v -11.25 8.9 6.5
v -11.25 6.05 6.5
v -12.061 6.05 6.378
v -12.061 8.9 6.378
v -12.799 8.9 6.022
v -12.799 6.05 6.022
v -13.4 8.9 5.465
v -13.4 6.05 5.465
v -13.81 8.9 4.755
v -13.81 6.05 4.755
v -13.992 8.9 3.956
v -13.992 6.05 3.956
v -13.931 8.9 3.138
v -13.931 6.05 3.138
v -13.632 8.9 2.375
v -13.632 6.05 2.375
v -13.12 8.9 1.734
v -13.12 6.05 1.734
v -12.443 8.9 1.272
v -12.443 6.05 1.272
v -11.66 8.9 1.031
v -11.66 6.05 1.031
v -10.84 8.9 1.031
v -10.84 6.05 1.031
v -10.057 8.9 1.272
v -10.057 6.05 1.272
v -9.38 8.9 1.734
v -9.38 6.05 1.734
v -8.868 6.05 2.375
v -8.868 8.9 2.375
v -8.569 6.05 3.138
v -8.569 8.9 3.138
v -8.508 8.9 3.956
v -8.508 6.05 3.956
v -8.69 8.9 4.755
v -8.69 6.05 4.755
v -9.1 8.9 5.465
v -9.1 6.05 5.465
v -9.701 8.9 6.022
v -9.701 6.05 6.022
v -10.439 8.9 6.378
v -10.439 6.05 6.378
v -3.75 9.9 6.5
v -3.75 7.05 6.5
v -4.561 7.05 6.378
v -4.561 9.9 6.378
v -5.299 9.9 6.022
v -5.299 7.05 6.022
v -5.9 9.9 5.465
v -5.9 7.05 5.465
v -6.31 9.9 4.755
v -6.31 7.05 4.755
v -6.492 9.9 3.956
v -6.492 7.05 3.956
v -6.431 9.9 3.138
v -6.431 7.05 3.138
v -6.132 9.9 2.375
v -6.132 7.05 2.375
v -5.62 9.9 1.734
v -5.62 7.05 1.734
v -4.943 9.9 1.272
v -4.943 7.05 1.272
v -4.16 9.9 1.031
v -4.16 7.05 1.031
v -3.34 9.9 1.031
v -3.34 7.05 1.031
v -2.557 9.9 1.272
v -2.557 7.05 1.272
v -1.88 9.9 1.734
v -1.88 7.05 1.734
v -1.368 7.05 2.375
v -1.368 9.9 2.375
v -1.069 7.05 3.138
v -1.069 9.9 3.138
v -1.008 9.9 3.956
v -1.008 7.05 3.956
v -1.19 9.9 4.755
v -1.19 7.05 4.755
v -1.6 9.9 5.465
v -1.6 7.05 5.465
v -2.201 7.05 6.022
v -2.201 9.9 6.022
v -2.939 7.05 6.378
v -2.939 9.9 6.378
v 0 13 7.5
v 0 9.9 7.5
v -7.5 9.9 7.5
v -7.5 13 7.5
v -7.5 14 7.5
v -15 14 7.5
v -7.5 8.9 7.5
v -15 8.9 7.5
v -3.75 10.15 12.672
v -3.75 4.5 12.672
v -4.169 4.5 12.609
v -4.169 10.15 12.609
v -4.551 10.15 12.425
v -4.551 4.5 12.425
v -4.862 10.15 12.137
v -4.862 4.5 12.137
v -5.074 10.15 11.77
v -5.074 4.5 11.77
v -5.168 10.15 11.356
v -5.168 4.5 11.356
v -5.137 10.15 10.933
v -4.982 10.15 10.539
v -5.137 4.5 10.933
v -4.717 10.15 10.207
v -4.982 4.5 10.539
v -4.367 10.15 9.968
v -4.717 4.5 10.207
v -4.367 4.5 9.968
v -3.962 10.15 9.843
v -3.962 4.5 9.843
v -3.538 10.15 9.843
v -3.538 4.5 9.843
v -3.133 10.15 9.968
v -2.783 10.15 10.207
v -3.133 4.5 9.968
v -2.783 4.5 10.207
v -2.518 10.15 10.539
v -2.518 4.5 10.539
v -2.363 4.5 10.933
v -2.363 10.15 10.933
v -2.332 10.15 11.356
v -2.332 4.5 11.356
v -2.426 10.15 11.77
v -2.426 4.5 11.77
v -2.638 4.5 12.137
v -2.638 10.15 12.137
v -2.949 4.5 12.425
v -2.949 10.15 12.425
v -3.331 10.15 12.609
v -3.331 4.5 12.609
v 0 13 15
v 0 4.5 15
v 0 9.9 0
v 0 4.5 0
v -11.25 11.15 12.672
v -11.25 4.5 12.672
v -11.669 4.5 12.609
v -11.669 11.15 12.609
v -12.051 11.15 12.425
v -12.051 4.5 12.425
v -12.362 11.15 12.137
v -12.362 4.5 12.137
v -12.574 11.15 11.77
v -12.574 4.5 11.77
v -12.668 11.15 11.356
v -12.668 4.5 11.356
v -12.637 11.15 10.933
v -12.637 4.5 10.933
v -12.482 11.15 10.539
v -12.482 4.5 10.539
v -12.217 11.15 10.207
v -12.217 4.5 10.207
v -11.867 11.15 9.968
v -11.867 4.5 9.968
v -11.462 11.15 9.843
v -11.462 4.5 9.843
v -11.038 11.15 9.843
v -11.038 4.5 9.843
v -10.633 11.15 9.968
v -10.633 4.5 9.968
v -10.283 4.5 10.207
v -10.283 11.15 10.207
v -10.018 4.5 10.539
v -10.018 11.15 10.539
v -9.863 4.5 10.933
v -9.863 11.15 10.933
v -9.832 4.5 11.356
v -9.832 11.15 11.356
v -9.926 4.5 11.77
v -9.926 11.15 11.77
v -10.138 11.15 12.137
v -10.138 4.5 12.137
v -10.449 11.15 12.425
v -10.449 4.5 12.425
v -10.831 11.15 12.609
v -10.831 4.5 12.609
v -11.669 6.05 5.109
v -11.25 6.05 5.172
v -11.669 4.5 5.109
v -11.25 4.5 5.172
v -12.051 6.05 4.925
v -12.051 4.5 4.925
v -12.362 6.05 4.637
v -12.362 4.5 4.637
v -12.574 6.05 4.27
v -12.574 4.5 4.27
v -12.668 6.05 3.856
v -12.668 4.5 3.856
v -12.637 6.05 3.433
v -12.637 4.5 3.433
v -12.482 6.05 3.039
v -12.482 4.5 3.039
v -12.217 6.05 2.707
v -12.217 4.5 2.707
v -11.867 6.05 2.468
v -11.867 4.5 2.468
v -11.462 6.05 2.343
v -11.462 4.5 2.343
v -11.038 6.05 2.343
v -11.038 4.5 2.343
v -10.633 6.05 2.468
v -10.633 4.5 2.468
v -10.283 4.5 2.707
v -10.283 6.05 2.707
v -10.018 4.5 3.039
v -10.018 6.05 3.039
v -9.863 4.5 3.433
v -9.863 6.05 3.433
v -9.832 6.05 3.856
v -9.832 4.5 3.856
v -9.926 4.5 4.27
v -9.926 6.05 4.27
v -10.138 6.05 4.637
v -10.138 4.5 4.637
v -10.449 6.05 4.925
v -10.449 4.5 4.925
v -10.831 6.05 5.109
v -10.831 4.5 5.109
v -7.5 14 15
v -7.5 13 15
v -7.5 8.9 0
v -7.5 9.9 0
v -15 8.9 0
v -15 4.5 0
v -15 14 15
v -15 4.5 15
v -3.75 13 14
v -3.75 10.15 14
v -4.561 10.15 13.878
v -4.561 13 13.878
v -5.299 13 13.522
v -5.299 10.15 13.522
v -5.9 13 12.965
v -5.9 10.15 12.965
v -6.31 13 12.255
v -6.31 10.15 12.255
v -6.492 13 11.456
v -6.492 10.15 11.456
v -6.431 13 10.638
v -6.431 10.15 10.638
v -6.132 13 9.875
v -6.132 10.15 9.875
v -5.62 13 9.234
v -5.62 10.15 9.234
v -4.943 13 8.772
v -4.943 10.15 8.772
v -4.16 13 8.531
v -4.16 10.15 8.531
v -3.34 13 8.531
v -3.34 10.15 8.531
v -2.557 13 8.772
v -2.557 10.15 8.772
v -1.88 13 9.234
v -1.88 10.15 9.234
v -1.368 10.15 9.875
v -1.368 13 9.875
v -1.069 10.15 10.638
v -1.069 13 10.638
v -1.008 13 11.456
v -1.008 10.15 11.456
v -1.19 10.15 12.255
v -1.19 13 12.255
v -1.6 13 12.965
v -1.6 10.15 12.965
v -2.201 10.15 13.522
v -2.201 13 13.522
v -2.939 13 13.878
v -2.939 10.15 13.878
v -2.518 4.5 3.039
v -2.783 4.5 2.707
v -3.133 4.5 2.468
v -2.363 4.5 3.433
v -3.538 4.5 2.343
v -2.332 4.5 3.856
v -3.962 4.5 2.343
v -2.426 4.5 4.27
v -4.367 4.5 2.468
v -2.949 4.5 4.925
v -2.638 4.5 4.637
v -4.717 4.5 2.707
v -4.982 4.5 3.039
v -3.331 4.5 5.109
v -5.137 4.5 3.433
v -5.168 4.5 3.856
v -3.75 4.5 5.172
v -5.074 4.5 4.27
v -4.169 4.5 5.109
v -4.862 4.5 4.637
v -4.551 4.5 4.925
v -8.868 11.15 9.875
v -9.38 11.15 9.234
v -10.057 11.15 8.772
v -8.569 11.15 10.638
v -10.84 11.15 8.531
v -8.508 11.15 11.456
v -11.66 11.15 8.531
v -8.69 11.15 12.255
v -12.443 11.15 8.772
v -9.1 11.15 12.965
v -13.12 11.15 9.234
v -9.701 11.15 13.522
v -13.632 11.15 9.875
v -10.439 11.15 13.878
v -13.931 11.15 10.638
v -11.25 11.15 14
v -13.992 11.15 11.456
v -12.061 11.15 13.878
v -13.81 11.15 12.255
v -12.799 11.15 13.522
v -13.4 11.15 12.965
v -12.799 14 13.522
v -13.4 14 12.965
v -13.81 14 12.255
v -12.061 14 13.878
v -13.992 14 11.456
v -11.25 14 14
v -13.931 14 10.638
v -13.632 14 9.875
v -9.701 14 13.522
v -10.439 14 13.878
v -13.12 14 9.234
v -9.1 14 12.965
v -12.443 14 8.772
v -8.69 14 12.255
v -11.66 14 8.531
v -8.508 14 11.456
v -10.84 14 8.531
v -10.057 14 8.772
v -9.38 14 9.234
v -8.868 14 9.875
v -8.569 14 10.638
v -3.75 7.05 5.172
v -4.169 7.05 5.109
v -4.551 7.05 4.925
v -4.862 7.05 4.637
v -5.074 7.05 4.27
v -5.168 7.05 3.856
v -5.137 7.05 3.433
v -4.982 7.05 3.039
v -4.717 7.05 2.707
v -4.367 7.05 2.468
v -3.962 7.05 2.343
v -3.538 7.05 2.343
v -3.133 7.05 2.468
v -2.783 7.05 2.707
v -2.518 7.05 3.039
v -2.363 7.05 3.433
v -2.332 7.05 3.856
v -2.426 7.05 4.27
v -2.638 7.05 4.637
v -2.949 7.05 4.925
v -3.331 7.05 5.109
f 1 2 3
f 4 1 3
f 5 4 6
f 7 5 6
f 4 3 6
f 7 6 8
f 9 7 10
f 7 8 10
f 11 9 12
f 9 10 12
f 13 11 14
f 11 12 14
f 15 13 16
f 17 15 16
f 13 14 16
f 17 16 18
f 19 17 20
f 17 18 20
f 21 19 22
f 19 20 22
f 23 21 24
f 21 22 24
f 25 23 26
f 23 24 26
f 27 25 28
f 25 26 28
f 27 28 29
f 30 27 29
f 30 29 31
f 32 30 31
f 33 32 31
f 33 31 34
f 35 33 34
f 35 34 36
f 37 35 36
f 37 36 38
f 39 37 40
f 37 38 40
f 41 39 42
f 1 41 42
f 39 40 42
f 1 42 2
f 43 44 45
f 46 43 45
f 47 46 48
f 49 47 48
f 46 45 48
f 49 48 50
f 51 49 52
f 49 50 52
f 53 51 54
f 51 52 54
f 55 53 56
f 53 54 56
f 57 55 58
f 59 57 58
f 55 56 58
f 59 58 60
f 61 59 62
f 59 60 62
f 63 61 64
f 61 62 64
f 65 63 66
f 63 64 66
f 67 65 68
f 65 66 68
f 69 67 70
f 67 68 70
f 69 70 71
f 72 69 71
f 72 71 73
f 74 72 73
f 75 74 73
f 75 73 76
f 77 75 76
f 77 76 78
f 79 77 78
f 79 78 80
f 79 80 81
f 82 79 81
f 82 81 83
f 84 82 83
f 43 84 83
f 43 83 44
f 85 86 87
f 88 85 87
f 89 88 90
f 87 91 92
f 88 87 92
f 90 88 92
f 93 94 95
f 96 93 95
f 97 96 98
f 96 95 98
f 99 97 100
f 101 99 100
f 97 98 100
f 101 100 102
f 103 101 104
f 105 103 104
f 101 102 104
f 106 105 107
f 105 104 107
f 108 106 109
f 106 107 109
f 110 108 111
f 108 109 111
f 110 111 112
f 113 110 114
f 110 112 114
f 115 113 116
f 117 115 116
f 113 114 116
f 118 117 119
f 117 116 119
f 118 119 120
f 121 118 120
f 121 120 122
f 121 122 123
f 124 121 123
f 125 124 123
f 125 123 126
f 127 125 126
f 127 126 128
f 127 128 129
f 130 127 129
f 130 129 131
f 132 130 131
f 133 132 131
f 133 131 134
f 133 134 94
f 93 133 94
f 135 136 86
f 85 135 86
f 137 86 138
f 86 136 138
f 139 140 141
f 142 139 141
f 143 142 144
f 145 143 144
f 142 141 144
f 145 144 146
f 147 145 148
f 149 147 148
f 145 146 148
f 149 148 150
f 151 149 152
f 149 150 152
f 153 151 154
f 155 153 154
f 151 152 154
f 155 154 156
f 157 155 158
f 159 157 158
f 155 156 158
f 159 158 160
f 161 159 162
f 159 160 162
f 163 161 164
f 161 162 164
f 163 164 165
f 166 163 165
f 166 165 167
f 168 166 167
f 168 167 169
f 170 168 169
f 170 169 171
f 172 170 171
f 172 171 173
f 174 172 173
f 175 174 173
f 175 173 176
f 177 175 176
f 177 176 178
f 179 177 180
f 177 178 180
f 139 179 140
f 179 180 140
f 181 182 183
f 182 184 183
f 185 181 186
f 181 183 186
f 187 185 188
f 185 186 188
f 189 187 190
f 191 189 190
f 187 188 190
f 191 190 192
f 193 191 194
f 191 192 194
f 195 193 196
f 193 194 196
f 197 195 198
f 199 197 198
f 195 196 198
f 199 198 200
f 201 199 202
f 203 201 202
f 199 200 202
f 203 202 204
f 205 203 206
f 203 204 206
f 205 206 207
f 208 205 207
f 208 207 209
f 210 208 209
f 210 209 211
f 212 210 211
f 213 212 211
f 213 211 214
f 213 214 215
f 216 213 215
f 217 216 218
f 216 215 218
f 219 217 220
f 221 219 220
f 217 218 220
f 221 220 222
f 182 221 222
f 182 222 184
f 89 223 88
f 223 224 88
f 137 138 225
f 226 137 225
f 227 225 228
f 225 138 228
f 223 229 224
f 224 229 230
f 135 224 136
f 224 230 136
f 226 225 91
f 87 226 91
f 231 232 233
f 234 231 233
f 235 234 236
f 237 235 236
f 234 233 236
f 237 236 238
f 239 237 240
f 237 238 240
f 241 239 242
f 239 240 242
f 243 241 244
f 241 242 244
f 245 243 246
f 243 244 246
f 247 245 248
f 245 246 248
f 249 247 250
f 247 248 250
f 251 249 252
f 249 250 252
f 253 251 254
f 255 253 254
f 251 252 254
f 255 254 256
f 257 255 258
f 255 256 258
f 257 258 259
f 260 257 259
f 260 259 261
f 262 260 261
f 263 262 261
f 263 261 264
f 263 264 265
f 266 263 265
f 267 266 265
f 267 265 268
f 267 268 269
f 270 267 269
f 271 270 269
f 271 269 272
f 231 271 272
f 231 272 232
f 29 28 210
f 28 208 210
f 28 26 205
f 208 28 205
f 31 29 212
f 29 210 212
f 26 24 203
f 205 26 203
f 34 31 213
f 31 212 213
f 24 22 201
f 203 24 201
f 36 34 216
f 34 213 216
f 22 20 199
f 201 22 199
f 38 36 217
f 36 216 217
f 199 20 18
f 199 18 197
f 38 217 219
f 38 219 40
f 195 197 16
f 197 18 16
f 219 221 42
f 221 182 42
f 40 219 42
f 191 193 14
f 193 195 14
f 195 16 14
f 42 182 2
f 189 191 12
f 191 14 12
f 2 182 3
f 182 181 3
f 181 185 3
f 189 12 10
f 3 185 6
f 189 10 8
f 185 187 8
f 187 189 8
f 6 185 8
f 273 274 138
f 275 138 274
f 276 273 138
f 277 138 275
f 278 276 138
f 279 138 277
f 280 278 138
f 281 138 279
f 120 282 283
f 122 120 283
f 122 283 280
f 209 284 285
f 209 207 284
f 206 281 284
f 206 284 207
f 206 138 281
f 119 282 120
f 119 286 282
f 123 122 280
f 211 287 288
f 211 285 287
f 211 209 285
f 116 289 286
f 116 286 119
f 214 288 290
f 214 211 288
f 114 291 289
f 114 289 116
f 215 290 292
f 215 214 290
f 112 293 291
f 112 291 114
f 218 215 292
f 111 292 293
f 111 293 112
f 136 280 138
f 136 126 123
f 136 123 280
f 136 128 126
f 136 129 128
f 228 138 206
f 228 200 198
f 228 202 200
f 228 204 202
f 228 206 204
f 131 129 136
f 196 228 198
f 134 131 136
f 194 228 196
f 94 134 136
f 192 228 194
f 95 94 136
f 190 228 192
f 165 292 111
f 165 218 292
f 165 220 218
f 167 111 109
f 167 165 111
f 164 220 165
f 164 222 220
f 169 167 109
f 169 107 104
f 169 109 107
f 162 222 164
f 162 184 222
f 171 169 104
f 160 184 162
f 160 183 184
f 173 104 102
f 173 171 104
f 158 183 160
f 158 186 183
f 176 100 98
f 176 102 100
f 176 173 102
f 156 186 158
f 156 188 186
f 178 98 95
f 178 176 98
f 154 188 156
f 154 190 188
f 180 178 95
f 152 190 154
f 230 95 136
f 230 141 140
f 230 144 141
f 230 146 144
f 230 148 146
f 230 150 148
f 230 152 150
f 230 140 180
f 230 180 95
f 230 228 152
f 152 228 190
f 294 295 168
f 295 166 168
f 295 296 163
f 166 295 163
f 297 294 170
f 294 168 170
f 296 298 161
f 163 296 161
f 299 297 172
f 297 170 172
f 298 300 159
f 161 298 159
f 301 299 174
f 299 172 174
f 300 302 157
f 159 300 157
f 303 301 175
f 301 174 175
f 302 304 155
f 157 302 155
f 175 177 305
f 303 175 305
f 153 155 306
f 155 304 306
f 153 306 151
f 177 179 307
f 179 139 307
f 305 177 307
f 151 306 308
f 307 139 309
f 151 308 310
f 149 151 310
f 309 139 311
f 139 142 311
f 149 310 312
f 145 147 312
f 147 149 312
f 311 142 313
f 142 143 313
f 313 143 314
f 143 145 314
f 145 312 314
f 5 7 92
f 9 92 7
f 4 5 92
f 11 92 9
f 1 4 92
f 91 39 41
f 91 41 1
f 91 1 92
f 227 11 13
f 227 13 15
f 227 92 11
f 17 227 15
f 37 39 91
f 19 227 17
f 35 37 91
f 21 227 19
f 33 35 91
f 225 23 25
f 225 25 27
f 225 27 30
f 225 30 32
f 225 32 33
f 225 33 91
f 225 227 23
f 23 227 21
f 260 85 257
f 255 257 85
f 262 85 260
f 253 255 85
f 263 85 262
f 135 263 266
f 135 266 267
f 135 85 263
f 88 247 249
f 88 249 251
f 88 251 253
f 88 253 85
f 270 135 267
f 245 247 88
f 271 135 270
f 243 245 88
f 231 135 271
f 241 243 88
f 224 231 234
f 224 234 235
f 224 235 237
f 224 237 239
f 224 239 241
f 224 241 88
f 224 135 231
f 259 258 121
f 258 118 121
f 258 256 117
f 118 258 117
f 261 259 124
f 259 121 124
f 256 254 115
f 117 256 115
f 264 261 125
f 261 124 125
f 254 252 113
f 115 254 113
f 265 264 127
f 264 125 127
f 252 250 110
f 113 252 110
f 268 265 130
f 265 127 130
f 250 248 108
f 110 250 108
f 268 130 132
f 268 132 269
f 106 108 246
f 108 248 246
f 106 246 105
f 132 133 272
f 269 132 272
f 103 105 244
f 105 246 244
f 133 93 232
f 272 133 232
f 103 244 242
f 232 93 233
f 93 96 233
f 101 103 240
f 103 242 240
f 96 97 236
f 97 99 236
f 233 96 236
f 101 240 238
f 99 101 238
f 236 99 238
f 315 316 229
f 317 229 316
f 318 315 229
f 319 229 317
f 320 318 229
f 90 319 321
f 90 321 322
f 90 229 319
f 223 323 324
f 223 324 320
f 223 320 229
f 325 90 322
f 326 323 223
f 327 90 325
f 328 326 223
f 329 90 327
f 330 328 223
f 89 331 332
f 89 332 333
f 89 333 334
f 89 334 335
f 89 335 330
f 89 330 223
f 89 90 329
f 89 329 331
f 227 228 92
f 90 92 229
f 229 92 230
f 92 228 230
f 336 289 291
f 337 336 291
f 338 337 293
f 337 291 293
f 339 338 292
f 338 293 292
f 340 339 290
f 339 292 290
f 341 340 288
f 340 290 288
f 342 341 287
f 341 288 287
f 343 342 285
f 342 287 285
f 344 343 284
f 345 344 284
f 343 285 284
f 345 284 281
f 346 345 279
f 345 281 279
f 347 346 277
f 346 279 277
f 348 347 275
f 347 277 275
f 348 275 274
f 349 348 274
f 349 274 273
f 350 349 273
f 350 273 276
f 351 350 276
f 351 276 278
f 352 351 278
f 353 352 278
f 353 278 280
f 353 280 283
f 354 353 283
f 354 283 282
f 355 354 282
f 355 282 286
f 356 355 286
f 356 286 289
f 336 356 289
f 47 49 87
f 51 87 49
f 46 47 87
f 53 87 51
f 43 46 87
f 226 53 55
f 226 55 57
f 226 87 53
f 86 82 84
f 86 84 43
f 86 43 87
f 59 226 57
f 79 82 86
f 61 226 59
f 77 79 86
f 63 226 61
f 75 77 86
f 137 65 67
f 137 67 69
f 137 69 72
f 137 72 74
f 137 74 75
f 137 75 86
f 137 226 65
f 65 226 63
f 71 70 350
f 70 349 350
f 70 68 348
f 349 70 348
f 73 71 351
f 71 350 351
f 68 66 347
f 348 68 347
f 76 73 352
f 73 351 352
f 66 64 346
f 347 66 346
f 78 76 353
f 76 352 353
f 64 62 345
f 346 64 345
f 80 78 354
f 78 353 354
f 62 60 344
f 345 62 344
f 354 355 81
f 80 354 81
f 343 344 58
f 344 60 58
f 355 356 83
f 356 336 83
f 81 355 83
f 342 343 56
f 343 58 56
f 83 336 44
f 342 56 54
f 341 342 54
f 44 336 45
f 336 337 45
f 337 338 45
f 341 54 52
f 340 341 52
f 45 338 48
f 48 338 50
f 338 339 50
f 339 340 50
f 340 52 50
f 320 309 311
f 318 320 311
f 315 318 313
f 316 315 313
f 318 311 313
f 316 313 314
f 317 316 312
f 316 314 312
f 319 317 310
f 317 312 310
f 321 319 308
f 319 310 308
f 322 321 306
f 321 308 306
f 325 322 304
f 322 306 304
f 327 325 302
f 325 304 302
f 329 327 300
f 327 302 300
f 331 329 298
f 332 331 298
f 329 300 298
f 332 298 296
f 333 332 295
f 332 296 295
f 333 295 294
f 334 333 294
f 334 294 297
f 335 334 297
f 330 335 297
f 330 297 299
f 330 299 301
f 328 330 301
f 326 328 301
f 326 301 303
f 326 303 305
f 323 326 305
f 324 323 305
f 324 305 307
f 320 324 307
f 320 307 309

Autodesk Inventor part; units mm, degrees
ref_plane "YZ Plane" through (0, 0, 0) normal (1, 0, 0) x (0, 1, 0)
ref_plane "XY Plane" through (0, 0, 0) normal (0, 0, 1) x (1, 0, 0)
sketch "Sketch1" plane through (0, 0, 0) normal (0, 1, 0) x (-1, 0, 0)
  line L0 (15, 15) -> (0, 15)
  line L1 (0, 15) -> (0, 0)
  line L2 (0, 0) -> (15, 0)
  line L3 (15, 0) -> (15, 15)
  dimension "d0" = 15
  dimension "d1" = 15
extrude "Extrusion1" add sketch "Sketch1" along normal blind 13
sketch "Sketch2" plane through (0, 13, 0) normal (0, 1, 0) x (1, 0, 0)
  line L0 (-15, -15) -> (0, -15) construction
  line L1 (0, -15) -> (0, 0) construction
  line L2 (0, 0) -> (-15, 0) construction
  line L3 (-15, 0) -> (-15, -15) construction
  line L4 (-15, 0) -> (-15, -15) construction
  line L5 (-15, -7.5) -> (0, -7.5) construction
  line L6 (-15, -7.5) -> (0, -7.5)
  line L7 (0, -7.5) -> (0, 0)
  line L8 (0, 0) -> (-15, 0)
  line L9 (-15, 0) -> (-15, -7.5)
extrude "Extrusion2" cut sketch "Sketch2" against normal blind 4.1
sketch "Sketch3" plane through (0, 13, 0) normal (0, 1, 0) x (1, 0, 0)
  line L0 (0, -7.5) -> (-15, -7.5) construction
  line L1 (-15, -7.5) -> (-15, -15) construction
  line L2 (-15, -15) -> (0, -15) construction
  line L3 (0, -15) -> (0, -7.5) construction
  line L4 (-15, -15) -> (0, -15) construction
  line L5 (-7.5, -15) -> (-7.5, -7.5) construction
  line L6 (-15, -15) -> (-7.5, -15)
  line L7 (-7.5, -15) -> (-7.5, -7.5)
  line L8 (-7.5, -7.5) -> (-15, -7.5)
  line L9 (-15, -7.5) -> (-15, -15)
  point P0 (0, 0)
extrude "Extrusion3" add sketch "Sketch3" along normal blind 1
sketch "Sketch4" plane through (0, 8.9, 0) normal (0, 1, 0) x (1, 0, 0)
  line L0 (0, 0) -> (0, -7.5) construction
  line L1 (-15, 0) -> (0, 0) construction
  line L2 (-15, -7.5) -> (-15, 0) construction
  line L3 (0, -7.5) -> (-15, -7.5) construction
  line L4 (-7.5, -7.5) -> (-7.5, 0) construction
  line L5 (-7.5, -7.5) -> (0, -7.5)
  line L6 (0, -7.5) -> (0, 0)
  line L7 (0, 0) -> (-7.5, 0)
  line L8 (-7.5, 0) -> (-7.5, -7.5)
extrude "Extrusion4" add sketch "Sketch4" along normal blind 1
sketch "Sketch5" plane through (0, 14, 0) normal (0, 1, 0) x (1, 0, 0)
  line L0 (-15, -15) -> (-7.5, -15) construction
  line L1 (-7.5, -15) -> (-7.5, -7.5) construction
  line L2 (-7.5, -7.5) -> (-15, -7.5) construction
  line L3 (-15, -7.5) -> (-15, -15) construction
  point P0 (0, 0)
  point P1 (-11.25, -11.25)
  point P2 (-11.25, -11.25)
sketch "Sketch6" plane through (0, 13, 0) normal (0, 1, 0) x (1, 0, 0)
  line L0 (-7.5, -7.5) -> (-7.5, -15) construction
  line L1 (-7.5, -15) -> (0, -15) construction
  line L2 (0, -15) -> (0, -7.5) construction
  line L3 (0, -7.5) -> (-7.5, -7.5) construction
  point P0 (0, 0)
  point P1 (-3.75, -11.25)
sketch "Sketch7" plane through (0, 9.9, 0) normal (0, 1, 0) x (1, 0, 0)
  line L0 (0, -7.5) -> (0, 0) construction
  line L1 (0, 0) -> (-7.5, 0) construction
  line L2 (-7.5, 0) -> (-7.5, -7.5) construction
  line L3 (0, -7.5) -> (-7.5, -7.5) construction
  point P0 (-3.75, -3.75)
sketch "Sketch8" plane through (0, 8.9, 0) normal (0, 1, 0) x (1, 0, 0)
  line L0 (-7.5, -7.5) -> (-7.5, 0) construction
  line L1 (-15, 0) -> (-7.5, 0) construction
  line L2 (-15, -7.5) -> (-15, 0) construction
  line L3 (-7.5, -7.5) -> (-15, -7.5) construction
  point P0 (0, 0)
  point P1 (-11.25, -3.75)
hole "Hole1" at (-11.25, 14, 11.25) direction (0, -1, 0) diameter 2.8448 depth 10.414 counterbore diameter 5.5 counterbore depth 2.85
hole "Hole2" at (-3.75, 13, 11.25) direction (0, -1, 0) diameter 2.8448 depth 10.414 counterbore diameter 5.5 counterbore depth 2.85
hole "Hole3" at (-11.25, 8.9, 3.75) direction (0, -1, 0) diameter 2.8448 depth 10.414 counterbore diameter 5.5 counterbore depth 2.85
hole "Hole4" at (-3.75, 9.9, 3.75) direction (0, -1, 0) diameter 2.8448 depth 10.414 counterbore diameter 5.5 counterbore depth 2.85
ref_plane "Work Plane1" through (0, 4.5, 0) normal (0, 1, 0) x (-1, 0, 0)
split "Split1" plane through (0, 4.5, 0) removes the side toward (0, -1, 0)
properties part number "screwprint"
